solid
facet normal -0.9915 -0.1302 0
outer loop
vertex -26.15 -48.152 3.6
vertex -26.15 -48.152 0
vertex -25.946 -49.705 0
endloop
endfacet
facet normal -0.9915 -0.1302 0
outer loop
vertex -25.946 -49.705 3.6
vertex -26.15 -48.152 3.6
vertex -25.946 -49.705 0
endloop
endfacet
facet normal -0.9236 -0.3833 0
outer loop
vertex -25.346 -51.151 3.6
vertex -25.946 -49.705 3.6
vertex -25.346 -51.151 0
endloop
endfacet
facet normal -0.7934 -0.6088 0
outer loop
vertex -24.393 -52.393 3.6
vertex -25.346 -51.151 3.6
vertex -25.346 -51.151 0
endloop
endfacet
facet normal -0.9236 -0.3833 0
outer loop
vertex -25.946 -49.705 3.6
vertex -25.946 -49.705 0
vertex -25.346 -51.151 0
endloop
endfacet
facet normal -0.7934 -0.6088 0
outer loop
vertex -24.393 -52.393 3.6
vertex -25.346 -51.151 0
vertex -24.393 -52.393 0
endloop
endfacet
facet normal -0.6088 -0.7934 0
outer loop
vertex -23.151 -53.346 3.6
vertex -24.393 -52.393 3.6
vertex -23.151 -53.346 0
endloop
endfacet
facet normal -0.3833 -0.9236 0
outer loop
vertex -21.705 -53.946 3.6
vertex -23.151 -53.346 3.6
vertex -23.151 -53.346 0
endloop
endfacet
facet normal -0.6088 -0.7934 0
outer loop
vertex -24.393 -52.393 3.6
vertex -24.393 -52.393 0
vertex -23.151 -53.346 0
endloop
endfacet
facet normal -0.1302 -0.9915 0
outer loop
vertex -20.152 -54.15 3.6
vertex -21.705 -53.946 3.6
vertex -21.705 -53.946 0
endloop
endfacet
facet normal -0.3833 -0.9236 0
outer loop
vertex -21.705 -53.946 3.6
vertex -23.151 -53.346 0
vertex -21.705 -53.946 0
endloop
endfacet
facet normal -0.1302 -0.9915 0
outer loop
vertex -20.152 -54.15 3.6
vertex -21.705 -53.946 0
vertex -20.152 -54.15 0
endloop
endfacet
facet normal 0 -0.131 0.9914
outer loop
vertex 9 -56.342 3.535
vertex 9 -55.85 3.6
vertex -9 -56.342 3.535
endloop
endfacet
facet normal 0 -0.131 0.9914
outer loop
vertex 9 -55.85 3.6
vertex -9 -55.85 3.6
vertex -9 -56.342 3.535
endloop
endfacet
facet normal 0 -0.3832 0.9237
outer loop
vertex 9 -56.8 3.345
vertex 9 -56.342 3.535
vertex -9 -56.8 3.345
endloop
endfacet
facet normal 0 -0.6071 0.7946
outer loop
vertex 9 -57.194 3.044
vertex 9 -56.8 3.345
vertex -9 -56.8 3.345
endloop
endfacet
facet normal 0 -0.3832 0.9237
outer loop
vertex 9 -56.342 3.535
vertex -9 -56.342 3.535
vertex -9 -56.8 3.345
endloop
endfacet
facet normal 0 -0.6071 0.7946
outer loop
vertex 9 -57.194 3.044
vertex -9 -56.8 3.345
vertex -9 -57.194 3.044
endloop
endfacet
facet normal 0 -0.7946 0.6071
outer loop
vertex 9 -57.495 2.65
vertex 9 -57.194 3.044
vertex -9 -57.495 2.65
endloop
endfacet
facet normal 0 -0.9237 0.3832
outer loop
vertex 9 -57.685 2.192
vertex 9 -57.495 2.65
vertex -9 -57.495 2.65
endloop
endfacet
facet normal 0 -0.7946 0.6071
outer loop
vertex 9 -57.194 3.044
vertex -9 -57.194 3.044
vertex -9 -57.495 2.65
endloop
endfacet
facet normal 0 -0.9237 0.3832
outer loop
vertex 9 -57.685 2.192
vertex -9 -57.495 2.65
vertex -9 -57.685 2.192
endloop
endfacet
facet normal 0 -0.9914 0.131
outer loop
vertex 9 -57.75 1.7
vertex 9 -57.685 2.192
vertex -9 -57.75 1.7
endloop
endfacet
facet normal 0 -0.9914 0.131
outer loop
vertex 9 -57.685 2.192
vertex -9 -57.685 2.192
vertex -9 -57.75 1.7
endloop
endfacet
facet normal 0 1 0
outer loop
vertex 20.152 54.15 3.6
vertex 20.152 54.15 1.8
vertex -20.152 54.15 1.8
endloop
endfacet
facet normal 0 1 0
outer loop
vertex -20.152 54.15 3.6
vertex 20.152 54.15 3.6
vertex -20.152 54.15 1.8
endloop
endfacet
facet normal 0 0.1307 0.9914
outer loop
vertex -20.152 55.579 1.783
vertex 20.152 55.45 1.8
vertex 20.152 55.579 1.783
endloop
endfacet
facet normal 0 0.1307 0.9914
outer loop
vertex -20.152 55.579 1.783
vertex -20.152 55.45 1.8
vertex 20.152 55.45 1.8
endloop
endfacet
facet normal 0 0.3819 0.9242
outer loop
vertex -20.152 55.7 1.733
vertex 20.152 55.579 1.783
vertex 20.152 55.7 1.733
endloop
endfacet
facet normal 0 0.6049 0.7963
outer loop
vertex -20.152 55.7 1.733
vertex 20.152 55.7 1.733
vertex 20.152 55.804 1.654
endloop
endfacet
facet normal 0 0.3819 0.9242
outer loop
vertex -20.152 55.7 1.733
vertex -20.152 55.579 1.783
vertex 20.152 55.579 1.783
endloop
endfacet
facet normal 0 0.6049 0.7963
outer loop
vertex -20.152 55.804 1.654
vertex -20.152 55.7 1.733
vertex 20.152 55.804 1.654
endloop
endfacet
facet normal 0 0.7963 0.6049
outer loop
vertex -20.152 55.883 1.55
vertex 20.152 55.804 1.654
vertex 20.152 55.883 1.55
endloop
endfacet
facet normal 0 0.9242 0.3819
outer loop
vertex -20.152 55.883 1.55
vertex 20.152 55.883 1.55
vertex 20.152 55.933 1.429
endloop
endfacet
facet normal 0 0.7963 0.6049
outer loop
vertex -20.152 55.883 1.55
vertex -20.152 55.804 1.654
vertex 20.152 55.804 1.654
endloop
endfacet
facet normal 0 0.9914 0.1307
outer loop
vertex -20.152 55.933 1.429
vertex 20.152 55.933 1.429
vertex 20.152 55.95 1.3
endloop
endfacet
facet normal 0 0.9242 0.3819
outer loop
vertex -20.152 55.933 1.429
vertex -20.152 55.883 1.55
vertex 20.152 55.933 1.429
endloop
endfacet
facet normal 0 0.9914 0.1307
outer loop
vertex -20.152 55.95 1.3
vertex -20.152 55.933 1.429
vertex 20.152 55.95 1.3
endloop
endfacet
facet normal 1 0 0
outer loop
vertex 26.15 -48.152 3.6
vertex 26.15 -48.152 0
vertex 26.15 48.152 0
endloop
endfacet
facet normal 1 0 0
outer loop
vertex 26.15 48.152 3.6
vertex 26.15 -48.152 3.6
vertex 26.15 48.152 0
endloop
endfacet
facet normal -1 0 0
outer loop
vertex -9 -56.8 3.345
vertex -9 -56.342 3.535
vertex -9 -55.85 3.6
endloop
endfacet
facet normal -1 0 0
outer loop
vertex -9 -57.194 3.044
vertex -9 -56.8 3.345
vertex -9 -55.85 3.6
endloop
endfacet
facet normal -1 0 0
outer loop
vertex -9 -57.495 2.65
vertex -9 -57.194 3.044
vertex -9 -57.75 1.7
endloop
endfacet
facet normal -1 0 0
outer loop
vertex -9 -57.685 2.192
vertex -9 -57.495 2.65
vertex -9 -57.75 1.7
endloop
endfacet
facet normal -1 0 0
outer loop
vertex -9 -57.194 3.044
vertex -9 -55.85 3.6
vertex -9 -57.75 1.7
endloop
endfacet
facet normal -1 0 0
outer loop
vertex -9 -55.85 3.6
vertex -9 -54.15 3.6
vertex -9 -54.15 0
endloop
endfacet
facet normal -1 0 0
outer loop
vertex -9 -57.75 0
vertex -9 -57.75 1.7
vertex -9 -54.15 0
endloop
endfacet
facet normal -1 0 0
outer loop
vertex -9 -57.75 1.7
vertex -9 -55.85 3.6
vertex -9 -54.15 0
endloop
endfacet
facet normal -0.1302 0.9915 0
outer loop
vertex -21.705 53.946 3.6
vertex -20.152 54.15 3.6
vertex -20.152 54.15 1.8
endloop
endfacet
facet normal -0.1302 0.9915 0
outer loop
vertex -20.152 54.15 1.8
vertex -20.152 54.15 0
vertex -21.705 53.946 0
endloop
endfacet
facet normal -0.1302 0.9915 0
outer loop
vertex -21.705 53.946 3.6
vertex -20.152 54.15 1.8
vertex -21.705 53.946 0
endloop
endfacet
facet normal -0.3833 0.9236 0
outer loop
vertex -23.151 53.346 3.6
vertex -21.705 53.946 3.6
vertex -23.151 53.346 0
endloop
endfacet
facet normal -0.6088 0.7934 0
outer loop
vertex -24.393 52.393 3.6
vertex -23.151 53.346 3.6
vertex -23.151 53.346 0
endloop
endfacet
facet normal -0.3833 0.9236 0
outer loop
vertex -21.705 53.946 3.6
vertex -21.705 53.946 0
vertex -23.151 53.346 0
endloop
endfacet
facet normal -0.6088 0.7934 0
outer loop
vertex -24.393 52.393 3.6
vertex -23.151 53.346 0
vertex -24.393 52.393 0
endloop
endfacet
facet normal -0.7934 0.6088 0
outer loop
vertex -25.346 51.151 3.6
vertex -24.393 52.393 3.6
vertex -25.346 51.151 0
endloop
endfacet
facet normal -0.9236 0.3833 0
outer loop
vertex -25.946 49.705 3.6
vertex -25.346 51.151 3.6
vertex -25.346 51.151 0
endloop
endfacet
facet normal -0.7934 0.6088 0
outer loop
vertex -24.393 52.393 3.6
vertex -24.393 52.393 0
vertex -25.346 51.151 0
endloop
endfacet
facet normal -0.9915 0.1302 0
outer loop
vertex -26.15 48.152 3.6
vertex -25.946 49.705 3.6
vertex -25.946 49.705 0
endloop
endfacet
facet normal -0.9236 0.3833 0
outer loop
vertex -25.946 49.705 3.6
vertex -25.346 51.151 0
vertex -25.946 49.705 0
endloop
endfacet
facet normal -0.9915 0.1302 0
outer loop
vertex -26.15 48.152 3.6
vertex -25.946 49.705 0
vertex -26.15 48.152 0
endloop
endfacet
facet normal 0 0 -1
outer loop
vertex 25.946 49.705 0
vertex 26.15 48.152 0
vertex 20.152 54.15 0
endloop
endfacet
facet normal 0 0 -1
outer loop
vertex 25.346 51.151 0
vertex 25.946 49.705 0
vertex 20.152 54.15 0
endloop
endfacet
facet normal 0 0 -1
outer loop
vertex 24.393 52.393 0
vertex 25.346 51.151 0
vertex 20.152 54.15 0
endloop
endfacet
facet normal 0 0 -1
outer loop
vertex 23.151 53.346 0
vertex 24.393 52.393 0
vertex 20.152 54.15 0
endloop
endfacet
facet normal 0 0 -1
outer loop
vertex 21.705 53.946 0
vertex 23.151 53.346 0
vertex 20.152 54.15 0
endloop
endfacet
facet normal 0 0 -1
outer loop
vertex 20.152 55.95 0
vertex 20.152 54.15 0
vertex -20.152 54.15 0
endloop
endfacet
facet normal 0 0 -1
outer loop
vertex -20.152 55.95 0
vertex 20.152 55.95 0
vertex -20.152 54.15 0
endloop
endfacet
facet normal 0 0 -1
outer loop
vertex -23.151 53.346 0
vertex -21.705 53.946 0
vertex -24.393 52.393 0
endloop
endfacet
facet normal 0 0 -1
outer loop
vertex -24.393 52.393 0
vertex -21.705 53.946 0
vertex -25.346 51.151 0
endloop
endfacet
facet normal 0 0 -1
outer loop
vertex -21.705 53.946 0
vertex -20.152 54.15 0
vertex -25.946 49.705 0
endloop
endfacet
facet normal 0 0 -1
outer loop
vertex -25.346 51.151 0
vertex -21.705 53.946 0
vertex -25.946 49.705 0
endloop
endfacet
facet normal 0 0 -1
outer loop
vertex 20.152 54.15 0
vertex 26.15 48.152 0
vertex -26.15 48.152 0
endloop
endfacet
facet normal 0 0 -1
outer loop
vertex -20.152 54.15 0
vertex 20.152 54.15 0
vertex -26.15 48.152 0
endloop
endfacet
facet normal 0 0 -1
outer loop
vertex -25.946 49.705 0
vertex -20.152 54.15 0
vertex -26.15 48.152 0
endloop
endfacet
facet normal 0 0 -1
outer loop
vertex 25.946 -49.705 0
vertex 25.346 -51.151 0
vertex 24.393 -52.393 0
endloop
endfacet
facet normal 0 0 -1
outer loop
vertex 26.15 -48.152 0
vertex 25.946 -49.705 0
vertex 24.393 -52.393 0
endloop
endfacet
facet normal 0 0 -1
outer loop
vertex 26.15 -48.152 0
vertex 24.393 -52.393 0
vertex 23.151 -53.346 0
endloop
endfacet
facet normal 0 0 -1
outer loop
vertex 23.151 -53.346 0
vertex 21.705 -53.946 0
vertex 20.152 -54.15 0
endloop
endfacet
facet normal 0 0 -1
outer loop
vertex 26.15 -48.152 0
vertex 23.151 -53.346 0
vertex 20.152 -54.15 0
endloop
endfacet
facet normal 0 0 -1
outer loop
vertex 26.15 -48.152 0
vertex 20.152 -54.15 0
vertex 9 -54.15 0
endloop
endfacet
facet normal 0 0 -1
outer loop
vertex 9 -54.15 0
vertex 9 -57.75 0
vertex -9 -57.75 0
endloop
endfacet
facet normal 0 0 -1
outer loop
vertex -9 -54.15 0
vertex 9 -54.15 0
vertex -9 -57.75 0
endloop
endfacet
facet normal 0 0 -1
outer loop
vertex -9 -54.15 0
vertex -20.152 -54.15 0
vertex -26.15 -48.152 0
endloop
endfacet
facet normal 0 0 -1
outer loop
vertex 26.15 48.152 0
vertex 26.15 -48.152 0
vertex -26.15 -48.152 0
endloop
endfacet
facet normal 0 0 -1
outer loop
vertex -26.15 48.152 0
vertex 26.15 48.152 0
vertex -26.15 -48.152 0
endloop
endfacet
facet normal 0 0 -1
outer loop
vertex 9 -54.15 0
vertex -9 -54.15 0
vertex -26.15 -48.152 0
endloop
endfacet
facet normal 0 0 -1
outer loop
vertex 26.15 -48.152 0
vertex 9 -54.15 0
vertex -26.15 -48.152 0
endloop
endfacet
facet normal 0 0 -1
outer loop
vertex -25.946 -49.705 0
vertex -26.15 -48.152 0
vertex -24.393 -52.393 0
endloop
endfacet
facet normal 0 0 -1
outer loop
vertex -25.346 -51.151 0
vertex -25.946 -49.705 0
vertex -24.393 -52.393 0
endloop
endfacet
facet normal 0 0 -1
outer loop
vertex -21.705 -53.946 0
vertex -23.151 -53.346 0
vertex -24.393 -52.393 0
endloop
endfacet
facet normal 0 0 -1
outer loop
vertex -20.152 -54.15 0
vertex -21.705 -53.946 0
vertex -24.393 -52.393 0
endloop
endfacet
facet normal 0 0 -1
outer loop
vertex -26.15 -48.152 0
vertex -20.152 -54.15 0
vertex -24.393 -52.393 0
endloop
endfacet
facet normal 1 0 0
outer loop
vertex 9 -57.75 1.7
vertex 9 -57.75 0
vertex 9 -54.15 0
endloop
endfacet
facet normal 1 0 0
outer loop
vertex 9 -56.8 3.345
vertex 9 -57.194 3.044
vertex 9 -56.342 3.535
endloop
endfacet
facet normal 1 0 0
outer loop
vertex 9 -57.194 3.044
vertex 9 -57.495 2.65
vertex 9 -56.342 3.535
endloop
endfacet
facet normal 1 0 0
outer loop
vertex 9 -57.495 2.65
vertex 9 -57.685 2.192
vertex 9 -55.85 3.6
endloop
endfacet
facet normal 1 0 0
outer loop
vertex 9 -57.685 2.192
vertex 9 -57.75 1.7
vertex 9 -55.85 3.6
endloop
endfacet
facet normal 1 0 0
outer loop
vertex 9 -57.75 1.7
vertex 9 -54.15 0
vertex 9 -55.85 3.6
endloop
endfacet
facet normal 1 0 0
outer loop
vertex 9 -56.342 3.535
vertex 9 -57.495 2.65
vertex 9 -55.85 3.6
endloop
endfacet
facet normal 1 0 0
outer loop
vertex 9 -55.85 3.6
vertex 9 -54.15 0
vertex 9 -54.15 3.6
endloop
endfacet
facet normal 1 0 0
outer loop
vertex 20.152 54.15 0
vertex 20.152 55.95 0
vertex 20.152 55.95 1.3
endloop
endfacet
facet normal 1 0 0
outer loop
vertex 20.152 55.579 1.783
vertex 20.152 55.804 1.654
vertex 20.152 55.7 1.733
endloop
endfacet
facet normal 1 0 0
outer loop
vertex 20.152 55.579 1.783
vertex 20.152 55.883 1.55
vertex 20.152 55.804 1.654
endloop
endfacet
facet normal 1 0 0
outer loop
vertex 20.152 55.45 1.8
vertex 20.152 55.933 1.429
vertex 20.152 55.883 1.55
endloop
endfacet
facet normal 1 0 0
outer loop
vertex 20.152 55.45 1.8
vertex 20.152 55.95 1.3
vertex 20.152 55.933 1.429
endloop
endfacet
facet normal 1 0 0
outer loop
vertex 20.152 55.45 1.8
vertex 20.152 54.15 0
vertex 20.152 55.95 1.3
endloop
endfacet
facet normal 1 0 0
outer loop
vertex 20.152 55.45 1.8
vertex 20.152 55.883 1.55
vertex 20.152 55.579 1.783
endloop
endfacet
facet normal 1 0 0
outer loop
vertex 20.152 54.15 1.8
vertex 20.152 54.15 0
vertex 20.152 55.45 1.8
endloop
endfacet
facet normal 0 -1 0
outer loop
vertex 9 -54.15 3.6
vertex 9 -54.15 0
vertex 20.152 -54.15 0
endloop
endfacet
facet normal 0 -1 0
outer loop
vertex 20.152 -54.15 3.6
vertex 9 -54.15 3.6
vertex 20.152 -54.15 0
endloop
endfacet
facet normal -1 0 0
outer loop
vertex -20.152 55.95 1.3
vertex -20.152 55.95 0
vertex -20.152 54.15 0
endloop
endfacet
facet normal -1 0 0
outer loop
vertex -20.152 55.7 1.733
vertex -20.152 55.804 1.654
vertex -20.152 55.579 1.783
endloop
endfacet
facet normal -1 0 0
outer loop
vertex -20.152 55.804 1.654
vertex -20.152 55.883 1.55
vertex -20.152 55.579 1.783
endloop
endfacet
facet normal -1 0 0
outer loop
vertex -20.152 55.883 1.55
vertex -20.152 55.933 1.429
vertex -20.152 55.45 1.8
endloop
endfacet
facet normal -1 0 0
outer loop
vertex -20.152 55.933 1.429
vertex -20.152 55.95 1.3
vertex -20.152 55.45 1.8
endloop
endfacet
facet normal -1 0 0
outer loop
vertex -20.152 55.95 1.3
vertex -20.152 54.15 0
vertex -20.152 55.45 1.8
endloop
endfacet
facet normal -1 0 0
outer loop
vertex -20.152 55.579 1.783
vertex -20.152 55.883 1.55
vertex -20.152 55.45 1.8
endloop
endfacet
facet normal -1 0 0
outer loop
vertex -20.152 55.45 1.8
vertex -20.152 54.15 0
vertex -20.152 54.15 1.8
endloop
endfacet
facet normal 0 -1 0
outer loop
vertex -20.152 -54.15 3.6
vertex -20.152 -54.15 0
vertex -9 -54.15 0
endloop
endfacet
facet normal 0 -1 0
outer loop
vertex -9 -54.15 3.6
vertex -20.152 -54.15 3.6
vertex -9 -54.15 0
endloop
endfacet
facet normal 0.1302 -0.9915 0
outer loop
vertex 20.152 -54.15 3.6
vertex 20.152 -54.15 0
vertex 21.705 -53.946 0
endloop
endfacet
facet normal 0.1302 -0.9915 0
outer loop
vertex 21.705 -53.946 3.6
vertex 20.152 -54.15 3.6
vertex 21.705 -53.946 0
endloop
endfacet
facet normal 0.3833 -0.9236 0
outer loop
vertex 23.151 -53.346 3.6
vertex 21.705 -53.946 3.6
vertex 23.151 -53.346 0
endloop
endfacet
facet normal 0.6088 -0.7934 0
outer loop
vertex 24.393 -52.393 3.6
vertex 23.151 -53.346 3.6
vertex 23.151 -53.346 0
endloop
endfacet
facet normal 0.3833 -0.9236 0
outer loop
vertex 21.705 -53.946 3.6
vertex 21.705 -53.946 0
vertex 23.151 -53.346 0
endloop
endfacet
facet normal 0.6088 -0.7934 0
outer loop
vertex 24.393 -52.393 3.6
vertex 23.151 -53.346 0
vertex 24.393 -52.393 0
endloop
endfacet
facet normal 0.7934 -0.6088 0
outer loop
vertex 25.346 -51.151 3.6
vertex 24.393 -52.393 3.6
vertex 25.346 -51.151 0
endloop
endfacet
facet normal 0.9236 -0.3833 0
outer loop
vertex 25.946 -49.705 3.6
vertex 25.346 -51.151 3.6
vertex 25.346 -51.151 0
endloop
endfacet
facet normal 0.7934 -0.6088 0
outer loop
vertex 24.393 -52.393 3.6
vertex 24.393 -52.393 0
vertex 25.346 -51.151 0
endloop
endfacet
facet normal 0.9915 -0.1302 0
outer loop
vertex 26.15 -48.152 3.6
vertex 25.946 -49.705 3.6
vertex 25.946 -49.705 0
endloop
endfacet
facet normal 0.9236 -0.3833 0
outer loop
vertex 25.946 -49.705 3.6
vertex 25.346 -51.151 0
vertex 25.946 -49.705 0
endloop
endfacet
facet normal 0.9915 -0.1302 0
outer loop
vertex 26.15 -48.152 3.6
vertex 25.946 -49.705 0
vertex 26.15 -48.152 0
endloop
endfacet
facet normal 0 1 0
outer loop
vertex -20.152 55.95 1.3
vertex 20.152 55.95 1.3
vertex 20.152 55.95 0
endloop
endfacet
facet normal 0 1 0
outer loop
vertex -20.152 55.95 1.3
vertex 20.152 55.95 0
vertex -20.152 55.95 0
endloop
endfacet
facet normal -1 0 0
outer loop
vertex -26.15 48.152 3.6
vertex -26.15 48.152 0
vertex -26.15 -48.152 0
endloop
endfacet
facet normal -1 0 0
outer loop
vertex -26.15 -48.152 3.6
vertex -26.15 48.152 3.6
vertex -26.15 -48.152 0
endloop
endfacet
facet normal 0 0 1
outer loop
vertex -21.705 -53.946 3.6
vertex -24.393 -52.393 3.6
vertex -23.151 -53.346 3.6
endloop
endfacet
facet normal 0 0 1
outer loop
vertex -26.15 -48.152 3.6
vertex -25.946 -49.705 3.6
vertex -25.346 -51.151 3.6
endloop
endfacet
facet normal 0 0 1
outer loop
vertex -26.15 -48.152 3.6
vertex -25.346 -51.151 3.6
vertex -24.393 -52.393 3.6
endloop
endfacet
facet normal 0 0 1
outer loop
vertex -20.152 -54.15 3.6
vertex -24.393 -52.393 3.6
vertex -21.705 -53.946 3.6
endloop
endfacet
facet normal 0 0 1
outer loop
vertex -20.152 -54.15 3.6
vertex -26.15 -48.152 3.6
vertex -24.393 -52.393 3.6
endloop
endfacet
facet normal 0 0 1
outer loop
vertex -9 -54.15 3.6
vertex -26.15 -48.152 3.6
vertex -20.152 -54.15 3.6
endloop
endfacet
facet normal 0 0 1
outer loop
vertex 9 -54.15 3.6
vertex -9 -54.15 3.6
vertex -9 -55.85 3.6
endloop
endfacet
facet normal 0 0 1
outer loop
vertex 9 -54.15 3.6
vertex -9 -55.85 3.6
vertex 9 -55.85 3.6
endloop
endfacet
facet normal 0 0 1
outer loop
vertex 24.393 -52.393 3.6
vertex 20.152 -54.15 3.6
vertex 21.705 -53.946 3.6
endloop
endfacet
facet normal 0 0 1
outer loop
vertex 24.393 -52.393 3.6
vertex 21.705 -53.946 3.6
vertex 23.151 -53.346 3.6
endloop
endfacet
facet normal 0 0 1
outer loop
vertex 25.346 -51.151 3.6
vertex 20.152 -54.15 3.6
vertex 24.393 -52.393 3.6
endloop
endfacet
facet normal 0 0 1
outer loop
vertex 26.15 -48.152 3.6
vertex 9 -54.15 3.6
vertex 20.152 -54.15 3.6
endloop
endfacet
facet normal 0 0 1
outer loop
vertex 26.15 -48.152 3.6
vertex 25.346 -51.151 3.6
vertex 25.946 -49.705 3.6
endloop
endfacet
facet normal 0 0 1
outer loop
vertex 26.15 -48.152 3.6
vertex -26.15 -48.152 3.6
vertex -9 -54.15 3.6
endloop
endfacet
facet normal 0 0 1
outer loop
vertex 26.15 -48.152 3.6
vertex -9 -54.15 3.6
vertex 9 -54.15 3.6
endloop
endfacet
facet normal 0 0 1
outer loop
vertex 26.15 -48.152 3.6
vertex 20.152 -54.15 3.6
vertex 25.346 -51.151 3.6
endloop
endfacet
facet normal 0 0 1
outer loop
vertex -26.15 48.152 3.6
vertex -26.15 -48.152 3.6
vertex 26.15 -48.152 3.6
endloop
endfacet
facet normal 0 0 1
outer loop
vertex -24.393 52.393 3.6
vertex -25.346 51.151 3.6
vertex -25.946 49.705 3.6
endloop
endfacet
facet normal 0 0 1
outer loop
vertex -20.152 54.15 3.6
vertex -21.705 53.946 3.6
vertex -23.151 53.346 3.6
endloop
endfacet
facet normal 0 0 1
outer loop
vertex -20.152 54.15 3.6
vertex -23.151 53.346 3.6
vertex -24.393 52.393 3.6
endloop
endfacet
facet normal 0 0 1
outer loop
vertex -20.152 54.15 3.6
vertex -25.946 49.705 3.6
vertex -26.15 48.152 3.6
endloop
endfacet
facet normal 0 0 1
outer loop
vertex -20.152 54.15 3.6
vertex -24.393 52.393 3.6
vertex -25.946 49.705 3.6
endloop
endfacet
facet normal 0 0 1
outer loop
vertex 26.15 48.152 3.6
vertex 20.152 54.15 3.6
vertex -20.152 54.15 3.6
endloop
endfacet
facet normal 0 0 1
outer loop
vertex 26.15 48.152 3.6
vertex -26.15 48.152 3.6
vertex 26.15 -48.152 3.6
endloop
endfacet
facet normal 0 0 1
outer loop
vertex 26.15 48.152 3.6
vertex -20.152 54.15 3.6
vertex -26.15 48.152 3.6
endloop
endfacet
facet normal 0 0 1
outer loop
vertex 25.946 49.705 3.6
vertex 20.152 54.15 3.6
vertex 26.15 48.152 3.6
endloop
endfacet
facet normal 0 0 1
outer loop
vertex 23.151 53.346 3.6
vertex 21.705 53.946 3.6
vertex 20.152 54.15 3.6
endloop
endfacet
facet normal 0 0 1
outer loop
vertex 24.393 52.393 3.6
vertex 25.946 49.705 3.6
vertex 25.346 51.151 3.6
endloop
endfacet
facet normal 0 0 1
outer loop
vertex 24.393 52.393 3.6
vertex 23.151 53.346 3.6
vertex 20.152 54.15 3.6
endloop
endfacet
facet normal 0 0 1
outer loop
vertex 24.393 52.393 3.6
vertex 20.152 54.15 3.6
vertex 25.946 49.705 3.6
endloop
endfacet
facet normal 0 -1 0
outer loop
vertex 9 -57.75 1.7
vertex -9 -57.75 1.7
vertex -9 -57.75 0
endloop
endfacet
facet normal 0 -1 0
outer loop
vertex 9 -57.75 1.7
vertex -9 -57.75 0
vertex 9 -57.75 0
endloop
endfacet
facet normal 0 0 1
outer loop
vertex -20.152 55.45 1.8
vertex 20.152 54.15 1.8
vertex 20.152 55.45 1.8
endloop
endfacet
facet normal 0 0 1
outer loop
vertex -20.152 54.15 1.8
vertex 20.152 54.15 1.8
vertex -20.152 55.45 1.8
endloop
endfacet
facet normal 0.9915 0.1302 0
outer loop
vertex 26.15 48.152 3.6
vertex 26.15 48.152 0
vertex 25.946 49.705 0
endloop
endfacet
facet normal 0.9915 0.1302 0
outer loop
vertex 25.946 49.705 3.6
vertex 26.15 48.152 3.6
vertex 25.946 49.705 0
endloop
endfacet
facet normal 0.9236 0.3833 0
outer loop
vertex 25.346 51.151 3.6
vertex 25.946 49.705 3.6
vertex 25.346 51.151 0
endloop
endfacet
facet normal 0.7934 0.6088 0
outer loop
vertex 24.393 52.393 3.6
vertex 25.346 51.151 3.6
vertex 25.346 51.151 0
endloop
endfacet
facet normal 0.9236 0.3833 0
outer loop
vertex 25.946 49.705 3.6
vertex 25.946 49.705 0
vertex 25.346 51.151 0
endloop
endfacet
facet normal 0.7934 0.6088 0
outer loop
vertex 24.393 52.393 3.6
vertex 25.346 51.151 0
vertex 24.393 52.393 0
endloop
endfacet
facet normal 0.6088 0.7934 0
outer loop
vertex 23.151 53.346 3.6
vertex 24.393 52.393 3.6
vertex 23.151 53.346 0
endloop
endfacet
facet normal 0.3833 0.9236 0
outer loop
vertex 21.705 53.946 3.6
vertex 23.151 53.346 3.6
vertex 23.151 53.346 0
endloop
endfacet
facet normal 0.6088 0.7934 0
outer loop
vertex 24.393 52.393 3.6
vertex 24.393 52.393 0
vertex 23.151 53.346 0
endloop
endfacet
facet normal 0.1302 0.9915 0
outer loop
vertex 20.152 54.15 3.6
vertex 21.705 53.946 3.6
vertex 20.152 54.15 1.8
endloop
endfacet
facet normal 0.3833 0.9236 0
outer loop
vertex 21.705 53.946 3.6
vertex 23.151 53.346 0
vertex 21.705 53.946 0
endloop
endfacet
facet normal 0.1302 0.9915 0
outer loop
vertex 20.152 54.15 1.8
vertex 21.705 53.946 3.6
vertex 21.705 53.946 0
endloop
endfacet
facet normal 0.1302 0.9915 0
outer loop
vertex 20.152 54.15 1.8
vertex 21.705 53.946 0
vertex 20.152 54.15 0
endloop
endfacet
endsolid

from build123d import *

# Parameters (mm, degrees)
F2_DEPTH = 3.6
F4_DEPTH = 3.6
F5_W     = 40.3048
F5_H     = 1.8
F6_DEPTH = 1.8
F7_R     = 1.9
F8_R     = 0.5


with BuildPart() as f2:
    # F1 (on Top) → F2 (new body)
    with BuildSketch(Plane.XY):
        with BuildLine():
            Line((-20.1524, -54.15), (20.1524, -54.15))
            ThreePointArc((20.1524, -54.15), (24.3933436308, -52.3933436308), (26.15, -48.1524))
            Line((26.15, -48.1524), (26.15, 48.1524))
            ThreePointArc((26.15, 48.1524), (24.3933436308, 52.3933436308), (20.1524, 54.15))
            Line((20.1524, 54.15), (-20.1524, 54.15))
            ThreePointArc((-20.1524, 54.15), (-24.3933436308, 52.3933436308), (-26.15, 48.1524))
            Line((-26.15, 48.1524), (-26.15, -48.1524))
            ThreePointArc((-26.15, -48.1524), (-24.3933436308, -52.3933436308), (-20.1524, -54.15))
        make_face()
    extrude(amount=F2_DEPTH)

    # F3 (on face) → F4 (join)
    with BuildSketch(Plane.XZ.offset(54.15)):
        Polygon((9, 3.6), (-9, 3.6), (-9, 1.8), (-9, 0), (9, 0), (9, 1.8), align=None)
    extrude(amount=F4_DEPTH)

    # F5 (on face) → F6 (join)
    with BuildSketch(Plane(origin=(0, 54.15, 0), x_dir=(-1, 0, 0), z_dir=(0, 1, 0))):
        with Locations((0, 0.9)):
            Rectangle(F5_W, F5_H)
    extrude(amount=F6_DEPTH)

    # F7
    f7_edges = [f2.edges().sort_by_distance(p)[0] for p in [
        (0, -57.75, 3.6),
    ]]
    fillet(f7_edges, radius=F7_R)

    # F8
    f8_edges = [f2.edges().sort_by_distance(p)[0] for p in [
        (0, 55.95, 1.8),
    ]]
    fillet(f8_edges, radius=F8_R)


solid = f2.part
